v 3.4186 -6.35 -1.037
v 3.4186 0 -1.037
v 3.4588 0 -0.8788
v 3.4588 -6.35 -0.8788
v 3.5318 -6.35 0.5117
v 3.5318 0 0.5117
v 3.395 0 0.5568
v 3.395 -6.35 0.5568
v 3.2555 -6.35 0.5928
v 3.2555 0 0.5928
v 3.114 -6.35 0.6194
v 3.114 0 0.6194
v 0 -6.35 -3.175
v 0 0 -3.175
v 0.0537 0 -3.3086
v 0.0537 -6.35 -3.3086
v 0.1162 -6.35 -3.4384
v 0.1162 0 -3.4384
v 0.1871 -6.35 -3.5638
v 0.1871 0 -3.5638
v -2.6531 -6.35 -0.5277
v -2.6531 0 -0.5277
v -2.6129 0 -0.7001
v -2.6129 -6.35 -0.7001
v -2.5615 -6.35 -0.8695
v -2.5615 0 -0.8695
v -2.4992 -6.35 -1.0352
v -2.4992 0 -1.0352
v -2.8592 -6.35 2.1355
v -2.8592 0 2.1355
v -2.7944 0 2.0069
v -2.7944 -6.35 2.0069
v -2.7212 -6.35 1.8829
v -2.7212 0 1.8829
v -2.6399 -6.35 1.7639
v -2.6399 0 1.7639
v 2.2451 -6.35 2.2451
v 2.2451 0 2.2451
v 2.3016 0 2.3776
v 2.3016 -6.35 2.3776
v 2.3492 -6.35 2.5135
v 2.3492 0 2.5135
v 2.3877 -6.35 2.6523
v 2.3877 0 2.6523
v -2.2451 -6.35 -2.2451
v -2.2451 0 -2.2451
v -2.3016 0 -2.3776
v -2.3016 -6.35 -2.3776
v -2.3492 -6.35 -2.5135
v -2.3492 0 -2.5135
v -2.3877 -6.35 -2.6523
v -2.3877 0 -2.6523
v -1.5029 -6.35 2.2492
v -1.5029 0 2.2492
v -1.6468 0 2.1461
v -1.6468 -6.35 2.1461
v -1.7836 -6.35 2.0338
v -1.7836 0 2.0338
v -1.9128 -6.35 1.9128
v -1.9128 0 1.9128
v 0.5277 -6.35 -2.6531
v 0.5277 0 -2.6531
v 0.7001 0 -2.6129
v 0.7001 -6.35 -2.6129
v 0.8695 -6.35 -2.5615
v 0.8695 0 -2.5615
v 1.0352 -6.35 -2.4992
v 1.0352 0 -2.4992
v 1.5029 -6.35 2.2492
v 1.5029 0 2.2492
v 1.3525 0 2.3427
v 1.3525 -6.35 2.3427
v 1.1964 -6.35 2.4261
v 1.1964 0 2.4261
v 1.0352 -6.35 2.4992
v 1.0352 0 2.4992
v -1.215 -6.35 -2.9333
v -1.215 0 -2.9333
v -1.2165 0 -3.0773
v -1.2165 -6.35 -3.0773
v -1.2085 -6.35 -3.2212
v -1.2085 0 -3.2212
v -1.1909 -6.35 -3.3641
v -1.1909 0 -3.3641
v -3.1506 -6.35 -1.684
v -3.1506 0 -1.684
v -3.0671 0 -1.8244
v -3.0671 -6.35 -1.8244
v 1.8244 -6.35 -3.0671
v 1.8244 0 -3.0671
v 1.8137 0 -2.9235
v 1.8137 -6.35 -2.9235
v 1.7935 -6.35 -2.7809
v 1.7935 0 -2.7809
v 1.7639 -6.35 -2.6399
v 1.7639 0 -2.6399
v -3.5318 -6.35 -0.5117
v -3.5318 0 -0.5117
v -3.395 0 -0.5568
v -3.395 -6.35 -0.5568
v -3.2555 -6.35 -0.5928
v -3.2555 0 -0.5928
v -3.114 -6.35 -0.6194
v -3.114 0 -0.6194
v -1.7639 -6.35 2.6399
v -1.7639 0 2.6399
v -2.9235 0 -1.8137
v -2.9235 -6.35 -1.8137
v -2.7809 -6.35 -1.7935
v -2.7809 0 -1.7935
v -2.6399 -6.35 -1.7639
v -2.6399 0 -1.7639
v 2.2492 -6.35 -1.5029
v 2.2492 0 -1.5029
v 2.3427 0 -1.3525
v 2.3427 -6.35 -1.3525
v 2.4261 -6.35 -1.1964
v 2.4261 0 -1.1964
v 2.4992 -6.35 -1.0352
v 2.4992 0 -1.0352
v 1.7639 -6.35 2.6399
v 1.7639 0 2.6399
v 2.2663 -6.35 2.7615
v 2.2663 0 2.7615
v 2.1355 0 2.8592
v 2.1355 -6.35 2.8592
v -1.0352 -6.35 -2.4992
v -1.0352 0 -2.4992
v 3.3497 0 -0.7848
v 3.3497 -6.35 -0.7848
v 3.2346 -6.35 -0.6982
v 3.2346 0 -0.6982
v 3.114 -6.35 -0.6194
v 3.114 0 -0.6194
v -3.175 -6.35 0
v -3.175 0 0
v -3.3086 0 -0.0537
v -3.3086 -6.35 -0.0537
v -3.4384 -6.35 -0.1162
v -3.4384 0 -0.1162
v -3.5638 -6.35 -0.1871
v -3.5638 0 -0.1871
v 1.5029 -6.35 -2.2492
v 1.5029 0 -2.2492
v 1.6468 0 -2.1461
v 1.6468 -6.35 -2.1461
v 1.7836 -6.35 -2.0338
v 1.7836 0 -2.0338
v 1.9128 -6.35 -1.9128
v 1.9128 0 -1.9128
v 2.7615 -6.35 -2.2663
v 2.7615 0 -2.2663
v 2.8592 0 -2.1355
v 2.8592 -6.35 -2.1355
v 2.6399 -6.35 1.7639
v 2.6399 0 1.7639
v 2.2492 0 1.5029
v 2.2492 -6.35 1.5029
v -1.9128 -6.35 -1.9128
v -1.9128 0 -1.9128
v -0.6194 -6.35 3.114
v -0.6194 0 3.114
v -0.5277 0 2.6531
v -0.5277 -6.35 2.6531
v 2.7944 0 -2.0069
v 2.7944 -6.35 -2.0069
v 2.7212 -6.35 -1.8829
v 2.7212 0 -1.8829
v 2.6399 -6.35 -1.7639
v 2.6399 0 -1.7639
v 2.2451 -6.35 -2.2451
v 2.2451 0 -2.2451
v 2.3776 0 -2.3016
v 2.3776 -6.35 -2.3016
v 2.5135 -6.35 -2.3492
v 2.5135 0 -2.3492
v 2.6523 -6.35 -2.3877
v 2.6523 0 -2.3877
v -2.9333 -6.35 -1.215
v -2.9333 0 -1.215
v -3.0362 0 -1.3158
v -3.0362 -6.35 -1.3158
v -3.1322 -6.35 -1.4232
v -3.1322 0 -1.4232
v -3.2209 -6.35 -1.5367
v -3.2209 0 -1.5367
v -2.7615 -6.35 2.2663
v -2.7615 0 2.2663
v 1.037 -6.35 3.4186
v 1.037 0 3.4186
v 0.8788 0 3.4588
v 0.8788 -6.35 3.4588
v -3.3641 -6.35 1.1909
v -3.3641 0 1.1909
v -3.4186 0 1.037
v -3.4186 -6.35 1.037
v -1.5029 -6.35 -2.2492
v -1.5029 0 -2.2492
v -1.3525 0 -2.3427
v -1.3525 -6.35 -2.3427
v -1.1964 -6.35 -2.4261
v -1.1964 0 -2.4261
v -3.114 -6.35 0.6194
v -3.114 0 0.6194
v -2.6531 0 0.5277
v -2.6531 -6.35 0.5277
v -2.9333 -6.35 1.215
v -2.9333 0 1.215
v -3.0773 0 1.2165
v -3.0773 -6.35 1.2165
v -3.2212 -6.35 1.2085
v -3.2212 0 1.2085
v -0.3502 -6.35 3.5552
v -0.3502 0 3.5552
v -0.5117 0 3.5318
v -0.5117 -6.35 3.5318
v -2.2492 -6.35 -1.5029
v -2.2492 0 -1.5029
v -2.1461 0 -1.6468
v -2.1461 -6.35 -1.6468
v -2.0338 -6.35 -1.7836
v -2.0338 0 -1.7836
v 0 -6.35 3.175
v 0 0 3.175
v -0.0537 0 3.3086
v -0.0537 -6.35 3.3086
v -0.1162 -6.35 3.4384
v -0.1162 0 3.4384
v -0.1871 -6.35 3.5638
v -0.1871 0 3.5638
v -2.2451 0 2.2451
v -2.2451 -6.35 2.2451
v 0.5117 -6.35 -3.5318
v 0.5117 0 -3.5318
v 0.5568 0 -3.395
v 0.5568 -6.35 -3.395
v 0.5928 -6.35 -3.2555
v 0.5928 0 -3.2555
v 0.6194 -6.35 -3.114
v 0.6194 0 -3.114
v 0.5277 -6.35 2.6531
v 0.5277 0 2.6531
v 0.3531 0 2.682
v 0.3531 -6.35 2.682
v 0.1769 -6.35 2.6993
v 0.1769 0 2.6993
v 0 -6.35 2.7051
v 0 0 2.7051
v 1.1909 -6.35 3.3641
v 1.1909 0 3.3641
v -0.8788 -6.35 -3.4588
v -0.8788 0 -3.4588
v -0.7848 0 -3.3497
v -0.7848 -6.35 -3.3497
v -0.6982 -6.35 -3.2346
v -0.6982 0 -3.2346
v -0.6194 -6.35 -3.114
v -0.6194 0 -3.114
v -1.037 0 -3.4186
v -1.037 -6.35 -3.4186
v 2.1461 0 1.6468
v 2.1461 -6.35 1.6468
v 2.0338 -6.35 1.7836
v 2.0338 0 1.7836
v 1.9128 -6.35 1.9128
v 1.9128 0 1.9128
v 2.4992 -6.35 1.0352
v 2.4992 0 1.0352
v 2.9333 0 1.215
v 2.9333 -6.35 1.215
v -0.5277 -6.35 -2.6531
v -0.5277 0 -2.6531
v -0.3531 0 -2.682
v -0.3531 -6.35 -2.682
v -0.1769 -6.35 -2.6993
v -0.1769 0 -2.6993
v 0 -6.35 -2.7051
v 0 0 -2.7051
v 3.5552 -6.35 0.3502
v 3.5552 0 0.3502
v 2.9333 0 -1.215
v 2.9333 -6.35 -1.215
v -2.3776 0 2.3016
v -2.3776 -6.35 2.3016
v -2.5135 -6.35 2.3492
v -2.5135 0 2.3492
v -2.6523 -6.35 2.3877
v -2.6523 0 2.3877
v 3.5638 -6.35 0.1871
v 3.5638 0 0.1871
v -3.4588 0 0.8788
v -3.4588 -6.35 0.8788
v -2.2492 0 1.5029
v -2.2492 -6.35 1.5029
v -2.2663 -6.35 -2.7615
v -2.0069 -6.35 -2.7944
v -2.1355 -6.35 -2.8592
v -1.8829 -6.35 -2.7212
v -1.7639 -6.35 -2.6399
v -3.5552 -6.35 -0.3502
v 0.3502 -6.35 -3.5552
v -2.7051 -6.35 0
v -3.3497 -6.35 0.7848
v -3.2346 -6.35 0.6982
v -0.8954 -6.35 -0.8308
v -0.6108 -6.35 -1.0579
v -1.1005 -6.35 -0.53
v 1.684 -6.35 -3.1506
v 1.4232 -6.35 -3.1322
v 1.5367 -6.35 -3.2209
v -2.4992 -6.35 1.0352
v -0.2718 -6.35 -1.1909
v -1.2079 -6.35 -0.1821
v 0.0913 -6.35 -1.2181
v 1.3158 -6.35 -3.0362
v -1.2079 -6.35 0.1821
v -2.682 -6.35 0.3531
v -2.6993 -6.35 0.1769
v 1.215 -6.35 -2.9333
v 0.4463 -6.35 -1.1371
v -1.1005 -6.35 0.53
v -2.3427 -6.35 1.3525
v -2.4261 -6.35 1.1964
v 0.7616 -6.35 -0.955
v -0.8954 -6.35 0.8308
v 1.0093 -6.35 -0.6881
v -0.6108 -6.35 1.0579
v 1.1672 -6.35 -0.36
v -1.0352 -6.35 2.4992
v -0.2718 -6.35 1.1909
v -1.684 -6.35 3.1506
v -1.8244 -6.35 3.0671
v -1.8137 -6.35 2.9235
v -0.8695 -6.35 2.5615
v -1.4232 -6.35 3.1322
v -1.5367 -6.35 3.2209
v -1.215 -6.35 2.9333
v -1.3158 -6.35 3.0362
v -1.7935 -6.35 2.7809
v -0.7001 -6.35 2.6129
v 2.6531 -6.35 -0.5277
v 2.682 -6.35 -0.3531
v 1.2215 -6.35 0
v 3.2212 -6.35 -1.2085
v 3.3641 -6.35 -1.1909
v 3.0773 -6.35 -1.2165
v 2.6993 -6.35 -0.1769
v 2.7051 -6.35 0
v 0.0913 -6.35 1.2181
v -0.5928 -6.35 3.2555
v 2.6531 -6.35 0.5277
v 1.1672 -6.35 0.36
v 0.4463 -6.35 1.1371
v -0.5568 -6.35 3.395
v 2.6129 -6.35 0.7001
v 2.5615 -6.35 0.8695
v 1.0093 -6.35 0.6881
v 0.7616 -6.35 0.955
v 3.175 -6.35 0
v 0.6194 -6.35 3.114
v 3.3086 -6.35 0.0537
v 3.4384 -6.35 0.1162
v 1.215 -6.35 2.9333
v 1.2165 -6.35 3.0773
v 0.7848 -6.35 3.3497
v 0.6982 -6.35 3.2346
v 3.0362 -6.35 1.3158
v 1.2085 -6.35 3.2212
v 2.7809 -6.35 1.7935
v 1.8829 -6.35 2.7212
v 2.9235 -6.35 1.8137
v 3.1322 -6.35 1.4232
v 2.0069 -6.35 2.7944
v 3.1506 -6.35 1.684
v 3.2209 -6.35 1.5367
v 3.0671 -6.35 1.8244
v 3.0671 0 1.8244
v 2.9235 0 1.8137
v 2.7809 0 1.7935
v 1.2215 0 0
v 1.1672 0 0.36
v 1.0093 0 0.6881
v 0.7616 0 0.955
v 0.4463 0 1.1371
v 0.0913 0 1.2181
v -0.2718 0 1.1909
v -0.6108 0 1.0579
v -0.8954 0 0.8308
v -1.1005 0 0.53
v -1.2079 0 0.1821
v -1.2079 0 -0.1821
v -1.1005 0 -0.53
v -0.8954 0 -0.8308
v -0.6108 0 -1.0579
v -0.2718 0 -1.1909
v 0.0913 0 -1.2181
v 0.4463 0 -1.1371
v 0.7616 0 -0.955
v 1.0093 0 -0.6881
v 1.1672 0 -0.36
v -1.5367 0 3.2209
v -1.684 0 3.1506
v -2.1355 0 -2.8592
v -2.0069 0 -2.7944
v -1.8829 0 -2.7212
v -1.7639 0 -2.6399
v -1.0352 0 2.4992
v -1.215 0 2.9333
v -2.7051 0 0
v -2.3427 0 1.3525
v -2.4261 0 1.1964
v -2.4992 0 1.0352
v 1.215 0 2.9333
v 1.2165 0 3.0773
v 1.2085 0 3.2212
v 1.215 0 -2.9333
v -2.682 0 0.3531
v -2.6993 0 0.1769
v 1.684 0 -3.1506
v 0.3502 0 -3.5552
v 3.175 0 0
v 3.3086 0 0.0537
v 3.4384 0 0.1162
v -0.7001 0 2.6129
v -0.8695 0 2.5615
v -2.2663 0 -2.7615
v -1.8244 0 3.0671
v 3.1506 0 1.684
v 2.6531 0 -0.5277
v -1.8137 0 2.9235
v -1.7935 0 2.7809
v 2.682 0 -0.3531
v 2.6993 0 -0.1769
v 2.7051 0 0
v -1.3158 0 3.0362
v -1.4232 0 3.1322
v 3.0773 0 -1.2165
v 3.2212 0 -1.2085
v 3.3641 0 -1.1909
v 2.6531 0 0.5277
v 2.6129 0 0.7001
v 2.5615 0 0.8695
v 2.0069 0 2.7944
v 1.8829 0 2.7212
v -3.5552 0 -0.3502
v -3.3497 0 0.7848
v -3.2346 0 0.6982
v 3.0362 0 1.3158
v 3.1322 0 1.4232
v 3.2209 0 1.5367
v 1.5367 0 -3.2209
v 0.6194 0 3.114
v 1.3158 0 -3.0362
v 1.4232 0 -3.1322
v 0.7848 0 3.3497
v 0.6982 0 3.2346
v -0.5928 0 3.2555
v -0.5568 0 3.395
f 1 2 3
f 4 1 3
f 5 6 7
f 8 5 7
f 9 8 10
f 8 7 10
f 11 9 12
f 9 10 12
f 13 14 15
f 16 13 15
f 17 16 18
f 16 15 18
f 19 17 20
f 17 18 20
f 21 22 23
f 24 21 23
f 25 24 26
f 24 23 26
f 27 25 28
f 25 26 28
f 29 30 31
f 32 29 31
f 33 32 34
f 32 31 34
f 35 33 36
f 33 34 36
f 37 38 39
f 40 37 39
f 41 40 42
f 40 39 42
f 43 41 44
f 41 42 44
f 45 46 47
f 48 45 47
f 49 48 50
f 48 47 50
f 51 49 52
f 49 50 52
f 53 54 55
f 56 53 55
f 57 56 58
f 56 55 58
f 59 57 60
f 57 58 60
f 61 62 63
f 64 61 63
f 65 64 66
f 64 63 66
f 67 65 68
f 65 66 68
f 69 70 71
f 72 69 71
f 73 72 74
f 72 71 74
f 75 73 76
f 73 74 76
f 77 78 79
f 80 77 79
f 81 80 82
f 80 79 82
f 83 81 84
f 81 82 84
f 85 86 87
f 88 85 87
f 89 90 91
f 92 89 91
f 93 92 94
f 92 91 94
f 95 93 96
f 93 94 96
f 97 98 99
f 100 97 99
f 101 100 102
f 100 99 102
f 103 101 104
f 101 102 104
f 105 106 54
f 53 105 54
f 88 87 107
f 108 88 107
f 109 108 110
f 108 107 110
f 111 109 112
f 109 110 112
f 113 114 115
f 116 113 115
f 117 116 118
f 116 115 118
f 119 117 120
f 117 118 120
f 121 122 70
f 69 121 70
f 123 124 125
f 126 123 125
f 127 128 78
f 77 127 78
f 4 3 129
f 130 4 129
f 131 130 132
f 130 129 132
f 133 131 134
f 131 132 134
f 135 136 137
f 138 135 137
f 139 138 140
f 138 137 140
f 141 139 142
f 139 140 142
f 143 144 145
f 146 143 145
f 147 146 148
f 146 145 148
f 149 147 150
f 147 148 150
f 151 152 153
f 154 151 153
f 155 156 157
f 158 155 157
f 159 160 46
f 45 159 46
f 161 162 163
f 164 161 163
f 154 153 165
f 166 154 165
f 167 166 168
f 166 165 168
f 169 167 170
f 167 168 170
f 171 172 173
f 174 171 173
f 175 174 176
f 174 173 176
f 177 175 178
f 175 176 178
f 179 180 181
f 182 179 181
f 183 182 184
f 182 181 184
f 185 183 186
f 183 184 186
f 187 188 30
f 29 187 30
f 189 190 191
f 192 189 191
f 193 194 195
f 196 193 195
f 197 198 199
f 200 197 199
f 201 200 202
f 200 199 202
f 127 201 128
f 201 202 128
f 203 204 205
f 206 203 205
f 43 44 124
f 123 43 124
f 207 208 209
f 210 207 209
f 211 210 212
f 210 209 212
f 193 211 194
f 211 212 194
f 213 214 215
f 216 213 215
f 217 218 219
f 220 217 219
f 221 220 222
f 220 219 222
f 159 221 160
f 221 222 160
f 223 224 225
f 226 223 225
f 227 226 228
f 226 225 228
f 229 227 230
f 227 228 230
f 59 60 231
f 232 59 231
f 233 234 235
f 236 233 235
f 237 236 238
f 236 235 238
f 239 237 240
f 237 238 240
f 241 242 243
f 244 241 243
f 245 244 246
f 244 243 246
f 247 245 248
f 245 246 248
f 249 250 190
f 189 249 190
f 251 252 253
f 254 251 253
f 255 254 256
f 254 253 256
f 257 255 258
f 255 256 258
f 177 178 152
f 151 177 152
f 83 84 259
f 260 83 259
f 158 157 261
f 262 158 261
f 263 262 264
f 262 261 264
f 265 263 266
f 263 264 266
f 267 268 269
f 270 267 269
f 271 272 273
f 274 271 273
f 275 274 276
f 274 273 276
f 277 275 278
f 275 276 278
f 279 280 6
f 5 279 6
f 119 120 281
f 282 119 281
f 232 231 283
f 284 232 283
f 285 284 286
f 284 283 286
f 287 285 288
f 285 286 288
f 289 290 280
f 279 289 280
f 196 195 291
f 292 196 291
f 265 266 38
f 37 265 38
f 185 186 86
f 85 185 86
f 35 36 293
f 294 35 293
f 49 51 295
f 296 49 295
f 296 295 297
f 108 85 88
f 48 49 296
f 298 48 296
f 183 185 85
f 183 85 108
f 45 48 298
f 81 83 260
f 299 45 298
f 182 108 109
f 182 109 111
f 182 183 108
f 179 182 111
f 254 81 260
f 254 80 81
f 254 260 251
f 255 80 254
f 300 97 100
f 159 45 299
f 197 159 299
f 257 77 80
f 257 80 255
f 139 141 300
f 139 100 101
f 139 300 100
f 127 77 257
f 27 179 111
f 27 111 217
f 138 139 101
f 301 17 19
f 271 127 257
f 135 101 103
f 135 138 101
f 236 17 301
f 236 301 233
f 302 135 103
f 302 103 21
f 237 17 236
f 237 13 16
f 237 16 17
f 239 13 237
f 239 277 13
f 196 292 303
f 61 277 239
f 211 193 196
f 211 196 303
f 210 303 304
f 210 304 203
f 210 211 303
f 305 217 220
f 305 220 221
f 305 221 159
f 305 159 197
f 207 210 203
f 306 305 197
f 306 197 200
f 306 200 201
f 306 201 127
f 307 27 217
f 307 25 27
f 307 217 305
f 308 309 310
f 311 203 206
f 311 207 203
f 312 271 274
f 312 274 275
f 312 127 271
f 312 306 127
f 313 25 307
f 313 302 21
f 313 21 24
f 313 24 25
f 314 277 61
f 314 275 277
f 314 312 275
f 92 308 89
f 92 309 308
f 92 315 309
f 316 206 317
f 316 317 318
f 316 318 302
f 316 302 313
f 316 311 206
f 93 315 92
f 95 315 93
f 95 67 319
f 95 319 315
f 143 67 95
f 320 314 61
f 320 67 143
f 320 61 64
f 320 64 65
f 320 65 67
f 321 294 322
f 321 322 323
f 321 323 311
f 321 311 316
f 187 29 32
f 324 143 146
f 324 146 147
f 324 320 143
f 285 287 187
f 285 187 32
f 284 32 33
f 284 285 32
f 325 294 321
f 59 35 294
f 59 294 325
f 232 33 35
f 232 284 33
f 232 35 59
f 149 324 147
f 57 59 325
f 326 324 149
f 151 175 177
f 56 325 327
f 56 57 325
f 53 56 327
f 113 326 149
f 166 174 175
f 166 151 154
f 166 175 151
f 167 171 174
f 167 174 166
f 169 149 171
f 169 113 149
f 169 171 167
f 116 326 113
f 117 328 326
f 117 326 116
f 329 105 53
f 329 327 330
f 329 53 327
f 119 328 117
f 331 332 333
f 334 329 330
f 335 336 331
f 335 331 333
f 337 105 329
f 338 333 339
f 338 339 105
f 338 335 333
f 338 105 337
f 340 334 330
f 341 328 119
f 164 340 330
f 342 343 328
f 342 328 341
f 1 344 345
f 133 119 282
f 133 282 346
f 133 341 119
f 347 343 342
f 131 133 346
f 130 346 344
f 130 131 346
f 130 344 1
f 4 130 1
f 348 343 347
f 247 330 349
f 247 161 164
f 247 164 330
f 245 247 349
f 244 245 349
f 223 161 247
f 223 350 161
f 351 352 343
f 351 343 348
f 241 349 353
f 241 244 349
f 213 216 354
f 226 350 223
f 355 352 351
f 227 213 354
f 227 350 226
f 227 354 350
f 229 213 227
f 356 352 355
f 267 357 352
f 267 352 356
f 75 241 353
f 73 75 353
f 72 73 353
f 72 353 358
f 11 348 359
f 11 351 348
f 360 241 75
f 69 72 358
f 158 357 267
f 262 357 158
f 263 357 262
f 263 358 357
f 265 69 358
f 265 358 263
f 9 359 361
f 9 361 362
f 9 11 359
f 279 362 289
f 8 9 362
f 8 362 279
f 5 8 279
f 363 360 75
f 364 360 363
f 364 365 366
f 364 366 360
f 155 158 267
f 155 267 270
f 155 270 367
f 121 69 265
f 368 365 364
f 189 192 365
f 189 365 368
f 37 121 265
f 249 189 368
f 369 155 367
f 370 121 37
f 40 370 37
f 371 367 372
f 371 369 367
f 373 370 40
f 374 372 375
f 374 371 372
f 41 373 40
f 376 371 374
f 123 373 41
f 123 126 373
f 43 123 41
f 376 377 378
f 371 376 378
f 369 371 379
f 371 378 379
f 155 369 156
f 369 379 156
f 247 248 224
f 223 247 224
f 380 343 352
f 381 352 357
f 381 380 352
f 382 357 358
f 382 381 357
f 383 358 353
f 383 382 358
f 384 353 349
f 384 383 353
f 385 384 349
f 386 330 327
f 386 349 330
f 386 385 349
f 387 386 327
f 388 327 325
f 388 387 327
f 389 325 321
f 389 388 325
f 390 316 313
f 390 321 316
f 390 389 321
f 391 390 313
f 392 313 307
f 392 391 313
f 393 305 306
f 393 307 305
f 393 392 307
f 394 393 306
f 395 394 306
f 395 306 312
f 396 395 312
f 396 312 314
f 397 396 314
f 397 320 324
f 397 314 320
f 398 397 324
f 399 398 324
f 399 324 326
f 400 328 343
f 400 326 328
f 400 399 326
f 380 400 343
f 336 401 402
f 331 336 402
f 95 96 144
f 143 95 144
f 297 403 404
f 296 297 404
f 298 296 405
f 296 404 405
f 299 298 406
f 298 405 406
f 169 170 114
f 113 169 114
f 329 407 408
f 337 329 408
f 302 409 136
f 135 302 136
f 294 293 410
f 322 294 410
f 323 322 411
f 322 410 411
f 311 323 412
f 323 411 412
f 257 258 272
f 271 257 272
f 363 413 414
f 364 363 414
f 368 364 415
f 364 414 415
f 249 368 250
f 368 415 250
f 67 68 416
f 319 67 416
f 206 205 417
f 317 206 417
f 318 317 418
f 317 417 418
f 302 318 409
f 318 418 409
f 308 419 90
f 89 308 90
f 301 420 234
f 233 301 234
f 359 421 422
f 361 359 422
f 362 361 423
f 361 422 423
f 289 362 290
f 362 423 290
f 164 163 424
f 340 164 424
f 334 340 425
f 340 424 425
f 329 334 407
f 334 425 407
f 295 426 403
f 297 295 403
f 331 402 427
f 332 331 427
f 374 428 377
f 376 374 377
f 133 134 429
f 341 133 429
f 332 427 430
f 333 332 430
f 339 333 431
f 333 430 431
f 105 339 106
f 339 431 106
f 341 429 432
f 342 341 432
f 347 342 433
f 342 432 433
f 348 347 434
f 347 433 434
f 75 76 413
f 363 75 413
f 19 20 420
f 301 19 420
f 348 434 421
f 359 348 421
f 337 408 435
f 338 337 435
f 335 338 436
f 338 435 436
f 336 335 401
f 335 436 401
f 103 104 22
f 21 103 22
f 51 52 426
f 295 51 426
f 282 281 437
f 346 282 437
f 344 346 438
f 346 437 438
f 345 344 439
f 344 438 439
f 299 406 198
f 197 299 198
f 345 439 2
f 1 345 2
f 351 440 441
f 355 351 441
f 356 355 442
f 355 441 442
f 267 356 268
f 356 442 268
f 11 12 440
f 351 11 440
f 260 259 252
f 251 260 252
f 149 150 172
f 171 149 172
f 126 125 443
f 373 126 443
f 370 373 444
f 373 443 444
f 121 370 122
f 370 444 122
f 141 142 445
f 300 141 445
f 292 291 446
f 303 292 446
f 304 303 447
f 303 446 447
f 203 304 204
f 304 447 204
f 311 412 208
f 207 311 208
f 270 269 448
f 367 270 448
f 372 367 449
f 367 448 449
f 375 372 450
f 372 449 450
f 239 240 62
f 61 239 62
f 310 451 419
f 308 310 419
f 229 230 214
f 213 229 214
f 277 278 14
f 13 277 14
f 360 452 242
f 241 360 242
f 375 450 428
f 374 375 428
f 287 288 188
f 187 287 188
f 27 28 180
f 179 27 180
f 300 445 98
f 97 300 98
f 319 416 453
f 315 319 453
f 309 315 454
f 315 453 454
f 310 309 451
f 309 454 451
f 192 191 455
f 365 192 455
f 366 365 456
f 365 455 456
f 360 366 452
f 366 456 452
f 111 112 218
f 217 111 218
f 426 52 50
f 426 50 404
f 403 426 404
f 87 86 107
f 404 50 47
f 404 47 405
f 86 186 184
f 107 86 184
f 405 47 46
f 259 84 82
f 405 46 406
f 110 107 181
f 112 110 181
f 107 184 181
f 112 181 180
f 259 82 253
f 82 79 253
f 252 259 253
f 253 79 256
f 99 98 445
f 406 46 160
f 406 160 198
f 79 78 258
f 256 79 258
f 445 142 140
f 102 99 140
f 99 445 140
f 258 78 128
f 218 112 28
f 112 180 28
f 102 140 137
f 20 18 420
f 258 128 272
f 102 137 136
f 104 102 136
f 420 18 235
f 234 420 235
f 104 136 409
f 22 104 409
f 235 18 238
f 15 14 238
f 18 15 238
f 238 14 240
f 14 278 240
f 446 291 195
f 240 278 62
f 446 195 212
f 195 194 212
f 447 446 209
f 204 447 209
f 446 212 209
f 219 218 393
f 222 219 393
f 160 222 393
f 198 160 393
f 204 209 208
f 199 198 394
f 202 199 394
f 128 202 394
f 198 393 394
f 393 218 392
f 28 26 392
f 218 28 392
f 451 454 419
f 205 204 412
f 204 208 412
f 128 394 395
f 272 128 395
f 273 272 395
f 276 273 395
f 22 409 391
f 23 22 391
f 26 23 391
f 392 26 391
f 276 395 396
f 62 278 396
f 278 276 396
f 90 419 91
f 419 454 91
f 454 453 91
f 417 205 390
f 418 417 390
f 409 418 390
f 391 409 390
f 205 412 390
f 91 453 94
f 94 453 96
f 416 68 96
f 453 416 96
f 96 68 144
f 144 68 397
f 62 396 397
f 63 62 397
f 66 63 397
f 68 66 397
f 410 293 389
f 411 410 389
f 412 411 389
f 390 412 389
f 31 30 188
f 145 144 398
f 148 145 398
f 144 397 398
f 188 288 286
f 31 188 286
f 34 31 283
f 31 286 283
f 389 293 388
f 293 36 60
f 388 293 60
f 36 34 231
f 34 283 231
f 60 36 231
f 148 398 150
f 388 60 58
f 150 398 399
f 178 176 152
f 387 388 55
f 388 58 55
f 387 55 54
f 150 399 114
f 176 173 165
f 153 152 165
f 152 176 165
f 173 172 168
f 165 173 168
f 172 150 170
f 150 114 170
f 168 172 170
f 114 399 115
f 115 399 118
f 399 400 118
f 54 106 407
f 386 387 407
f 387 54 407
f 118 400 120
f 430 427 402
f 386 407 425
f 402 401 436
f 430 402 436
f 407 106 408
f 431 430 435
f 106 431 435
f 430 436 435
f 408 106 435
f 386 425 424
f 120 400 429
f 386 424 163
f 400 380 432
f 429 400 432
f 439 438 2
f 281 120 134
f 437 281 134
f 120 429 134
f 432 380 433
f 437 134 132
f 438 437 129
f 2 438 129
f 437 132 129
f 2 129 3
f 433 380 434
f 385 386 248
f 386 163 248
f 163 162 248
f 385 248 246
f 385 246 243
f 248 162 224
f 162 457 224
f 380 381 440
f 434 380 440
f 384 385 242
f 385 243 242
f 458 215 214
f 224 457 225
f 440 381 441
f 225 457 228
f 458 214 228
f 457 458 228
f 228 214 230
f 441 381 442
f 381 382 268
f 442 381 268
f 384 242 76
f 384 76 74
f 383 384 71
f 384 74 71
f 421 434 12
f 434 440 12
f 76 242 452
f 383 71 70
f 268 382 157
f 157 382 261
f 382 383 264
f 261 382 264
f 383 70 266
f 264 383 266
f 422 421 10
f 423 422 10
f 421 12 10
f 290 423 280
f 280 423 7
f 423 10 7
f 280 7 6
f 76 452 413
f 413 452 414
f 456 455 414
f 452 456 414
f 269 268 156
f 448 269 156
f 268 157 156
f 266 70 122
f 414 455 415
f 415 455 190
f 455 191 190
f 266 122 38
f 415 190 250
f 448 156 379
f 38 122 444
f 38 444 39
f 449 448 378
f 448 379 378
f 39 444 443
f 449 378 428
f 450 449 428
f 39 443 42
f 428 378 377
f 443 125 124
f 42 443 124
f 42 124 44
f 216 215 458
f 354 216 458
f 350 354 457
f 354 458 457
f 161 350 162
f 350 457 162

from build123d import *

# Parameters (mm, degrees)
F1_DEPTH = 6.35
F2_R     = 1.221512
F3_DEPTH = 30.89672


with BuildPart() as f1:
    # F0 (on Front) → F1 (new body)
    with BuildSketch(Plane.XZ):
        with BuildLine():
            Line((-1.763935, 2.639916), (-1.502873, 2.249208))
            ThreePointArc((-1.502873, 2.249208), (-1.716097, 2.091071), (-1.912795, 1.912795))
            Line((-1.912795, 1.912795), (-2.245064, 2.245064))
            ThreePointArc((-2.245064, 2.245064), (-2.445129, 2.326504), (-2.652293, 2.387669))
            Line((-2.652293, 2.387669), (-2.761528, 2.266327))
            Line((-2.761528, 2.266327), (-2.859227, 2.135519))
            ThreePointArc((-2.859227, 2.135519), (-2.758822, 1.944268), (-2.639916, 1.763935))
            Line((-2.639916, 1.763935), (-2.249208, 1.502873))
            ThreePointArc((-2.249208, 1.502873), (-2.385685, 1.275175), (-2.499187, 1.035197))
            Line((-2.499187, 1.035197), (-2.933318, 1.21502))
            ThreePointArc((-2.933318, 1.21502), (-3.149319, 1.213699), (-3.36412, 1.19093))
            Line((-3.36412, 1.19093), (-3.418605, 1.037022))
            Line((-3.418605, 1.037022), (-3.458809, 0.878784))
            ThreePointArc((-3.458809, 0.878784), (-3.292858, 0.740514), (-3.113993, 0.619412))
            Line((-3.113993, 0.619412), (-2.653122, 0.527739))
            ThreePointArc((-2.653122, 0.527739), (-2.692074, 0.265146), (-2.7051, 0))
            Line((-2.7051, 0), (-3.175, 0))
            ThreePointArc((-3.175, 0), (-3.374054, -0.08388), (-3.563791, -0.187118))
            Line((-3.563791, -0.187118), (-3.55523, -0.35016))
            Line((-3.55523, -0.35016), (-3.531819, -0.511739))
            ThreePointArc((-3.531819, -0.511739), (-3.325586, -0.575977), (-3.113993, -0.619412))
            Line((-3.113993, -0.619412), (-2.653122, -0.527739))
            ThreePointArc((-2.653122, -0.527739), (-2.588619, -0.785249), (-2.499187, -1.035197))
            Line((-2.499187, -1.035197), (-2.933318, -1.21502))
            ThreePointArc((-2.933318, -1.21502), (-3.08512, -1.36869), (-3.220907, -1.536678))
            Line((-3.220907, -1.536678), (-3.150604, -1.684033))
            Line((-3.150604, -1.684033), (-3.067141, -1.824353))
            ThreePointArc((-3.067141, -1.824353), (-2.852024, -1.80478), (-2.639916, -1.763935))
            Line((-2.639916, -1.763935), (-2.249208, -1.502873))
            ThreePointArc((-2.249208, -1.502873), (-2.091071, -1.716097), (-1.912795, -1.912795))
            Line((-1.912795, -1.912795), (-2.245064, -2.245064))
            ThreePointArc((-2.245064, -2.245064), (-2.326504, -2.445129), (-2.387669, -2.652293))
            Line((-2.387669, -2.652293), (-2.266327, -2.761528))
            Line((-2.266327, -2.761528), (-2.135519, -2.859227))
            ThreePointArc((-2.135519, -2.859227), (-1.944268, -2.758822), (-1.763935, -2.639916))
            Line((-1.763935, -2.639916), (-1.502873, -2.249208))
            ThreePointArc((-1.502873, -2.249208), (-1.275175, -2.385685), (-1.035197, -2.499187))
            Line((-1.035197, -2.499187), (-1.21502, -2.933318))
            ThreePointArc((-1.21502, -2.933318), (-1.213699, -3.149319), (-1.19093, -3.36412))
            Line((-1.19093, -3.36412), (-1.037022, -3.418605))
            Line((-1.037022, -3.418605), (-0.878784, -3.458809))
            ThreePointArc((-0.878784, -3.458809), (-0.740514, -3.292858), (-0.619412, -3.113993))
            Line((-0.619412, -3.113993), (-0.527739, -2.653122))
            ThreePointArc((-0.527739, -2.653122), (-0.265146, -2.692074), (0, -2.7051))
            Line((0, -2.7051), (0, -3.175))
            ThreePointArc((0, -3.175), (0.08388, -3.374054), (0.187118, -3.563791))
            Line((0.187118, -3.563791), (0.35016, -3.55523))
            Line((0.35016, -3.55523), (0.511739, -3.531819))
            ThreePointArc((0.511739, -3.531819), (0.575977, -3.325586), (0.619412, -3.113993))
            Line((0.619412, -3.113993), (0.527739, -2.653122))
            ThreePointArc((0.527739, -2.653122), (0.785249, -2.588619), (1.035197, -2.499187))
            Line((1.035197, -2.499187), (1.21502, -2.933318))
            ThreePointArc((1.21502, -2.933318), (1.36869, -3.08512), (1.536678, -3.220907))
            Line((1.536678, -3.220907), (1.684033, -3.150604))
            Line((1.684033, -3.150604), (1.824353, -3.067141))
            ThreePointArc((1.824353, -3.067141), (1.80478, -2.852024), (1.763935, -2.639916))
            Line((1.763935, -2.639916), (1.502873, -2.249208))
            ThreePointArc((1.502873, -2.249208), (1.716097, -2.091071), (1.912795, -1.912795))
            Line((1.912795, -1.912795), (2.245064, -2.245064))
            ThreePointArc((2.245064, -2.245064), (2.445129, -2.326504), (2.652293, -2.387669))
            Line((2.652293, -2.387669), (2.761528, -2.266327))
            Line((2.761528, -2.266327), (2.859227, -2.135519))
            ThreePointArc((2.859227, -2.135519), (2.758822, -1.944268), (2.639916, -1.763935))
            Line((2.639916, -1.763935), (2.249208, -1.502873))
            ThreePointArc((2.249208, -1.502873), (2.385685, -1.275175), (2.499187, -1.035197))
            Line((2.499187, -1.035197), (2.933318, -1.21502))
            ThreePointArc((2.933318, -1.21502), (3.149319, -1.213699), (3.36412, -1.19093))
            Line((3.36412, -1.19093), (3.418605, -1.037022))
            Line((3.418605, -1.037022), (3.458809, -0.878784))
            ThreePointArc((3.458809, -0.878784), (3.292858, -0.740514), (3.113993, -0.619412))
            Line((3.113993, -0.619412), (2.653122, -0.527739))
            ThreePointArc((2.653122, -0.527739), (2.692074, -0.265146), (2.7051, 0))
            Line((2.7051, 0), (3.175, 0))
            ThreePointArc((3.175, 0), (3.374054, 0.08388), (3.563791, 0.187118))
            Line((3.563791, 0.187118), (3.55523, 0.35016))
            Line((3.55523, 0.35016), (3.531819, 0.511739))
            ThreePointArc((3.531819, 0.511739), (3.325586, 0.575977), (3.113993, 0.619412))
            Line((3.113993, 0.619412), (2.653122, 0.527739))
            ThreePointArc((2.653122, 0.527739), (2.588619, 0.785249), (2.499187, 1.035197))
            Line((2.499187, 1.035197), (2.933318, 1.21502))
            ThreePointArc((2.933318, 1.21502), (3.08512, 1.36869), (3.220907, 1.536678))
            Line((3.220907, 1.536678), (3.150604, 1.684033))
            Line((3.150604, 1.684033), (3.067141, 1.824353))
            ThreePointArc((3.067141, 1.824353), (2.852024, 1.80478), (2.639916, 1.763935))
            Line((2.639916, 1.763935), (2.249208, 1.502873))
            ThreePointArc((2.249208, 1.502873), (2.091071, 1.716097), (1.912795, 1.912795))
            Line((1.912795, 1.912795), (2.245064, 2.245064))
            ThreePointArc((2.245064, 2.245064), (2.326504, 2.445129), (2.387669, 2.652293))
            Line((2.387669, 2.652293), (2.266327, 2.761528))
            Line((2.266327, 2.761528), (2.135519, 2.859227))
            ThreePointArc((2.135519, 2.859227), (1.944268, 2.758822), (1.763935, 2.639916))
            Line((1.763935, 2.639916), (1.502873, 2.249208))
            ThreePointArc((1.502873, 2.249208), (1.275175, 2.385685), (1.035197, 2.499187))
            Line((1.035197, 2.499187), (1.21502, 2.933318))
            ThreePointArc((1.21502, 2.933318), (1.213699, 3.149319), (1.19093, 3.36412))
            Line((1.19093, 3.36412), (1.037022, 3.418605))
            Line((1.037022, 3.418605), (0.878784, 3.458809))
            ThreePointArc((0.878784, 3.458809), (0.740514, 3.292858), (0.619412, 3.113993))
            Line((0.619412, 3.113993), (0.527739, 2.653122))
            ThreePointArc((0.527739, 2.653122), (0.265146, 2.692074), (0, 2.7051))
            Line((0, 2.7051), (0, 3.175))
            ThreePointArc((0, 3.175), (-0.08388, 3.374054), (-0.187118, 3.563791))
            Line((-0.187118, 3.563791), (-0.35016, 3.55523))
            Line((-0.35016, 3.55523), (-0.511739, 3.531819))
            ThreePointArc((-0.511739, 3.531819), (-0.575977, 3.325586), (-0.619412, 3.113993))
            Line((-0.619412, 3.113993), (-0.527739, 2.653122))
            ThreePointArc((-0.527739, 2.653122), (-0.785249, 2.588619), (-1.035197, 2.499187))
            Line((-1.035197, 2.499187), (-1.21502, 2.933318))
            ThreePointArc((-1.21502, 2.933318), (-1.36869, 3.08512), (-1.536678, 3.220907))
            Line((-1.536678, 3.220907), (-1.684033, 3.150604))
            Line((-1.684033, 3.150604), (-1.824353, 3.067141))
            ThreePointArc((-1.824353, 3.067141), (-1.80478, 2.852024), (-1.763935, 2.639916))
        make_face()
    extrude(amount=F1_DEPTH)

    # F2 (on Front) → F3 (cut)
    with BuildSketch(Plane.XZ):
        Circle(F2_R)
    extrude(amount=F3_DEPTH, mode=Mode.SUBTRACT)


solid = f1.part
